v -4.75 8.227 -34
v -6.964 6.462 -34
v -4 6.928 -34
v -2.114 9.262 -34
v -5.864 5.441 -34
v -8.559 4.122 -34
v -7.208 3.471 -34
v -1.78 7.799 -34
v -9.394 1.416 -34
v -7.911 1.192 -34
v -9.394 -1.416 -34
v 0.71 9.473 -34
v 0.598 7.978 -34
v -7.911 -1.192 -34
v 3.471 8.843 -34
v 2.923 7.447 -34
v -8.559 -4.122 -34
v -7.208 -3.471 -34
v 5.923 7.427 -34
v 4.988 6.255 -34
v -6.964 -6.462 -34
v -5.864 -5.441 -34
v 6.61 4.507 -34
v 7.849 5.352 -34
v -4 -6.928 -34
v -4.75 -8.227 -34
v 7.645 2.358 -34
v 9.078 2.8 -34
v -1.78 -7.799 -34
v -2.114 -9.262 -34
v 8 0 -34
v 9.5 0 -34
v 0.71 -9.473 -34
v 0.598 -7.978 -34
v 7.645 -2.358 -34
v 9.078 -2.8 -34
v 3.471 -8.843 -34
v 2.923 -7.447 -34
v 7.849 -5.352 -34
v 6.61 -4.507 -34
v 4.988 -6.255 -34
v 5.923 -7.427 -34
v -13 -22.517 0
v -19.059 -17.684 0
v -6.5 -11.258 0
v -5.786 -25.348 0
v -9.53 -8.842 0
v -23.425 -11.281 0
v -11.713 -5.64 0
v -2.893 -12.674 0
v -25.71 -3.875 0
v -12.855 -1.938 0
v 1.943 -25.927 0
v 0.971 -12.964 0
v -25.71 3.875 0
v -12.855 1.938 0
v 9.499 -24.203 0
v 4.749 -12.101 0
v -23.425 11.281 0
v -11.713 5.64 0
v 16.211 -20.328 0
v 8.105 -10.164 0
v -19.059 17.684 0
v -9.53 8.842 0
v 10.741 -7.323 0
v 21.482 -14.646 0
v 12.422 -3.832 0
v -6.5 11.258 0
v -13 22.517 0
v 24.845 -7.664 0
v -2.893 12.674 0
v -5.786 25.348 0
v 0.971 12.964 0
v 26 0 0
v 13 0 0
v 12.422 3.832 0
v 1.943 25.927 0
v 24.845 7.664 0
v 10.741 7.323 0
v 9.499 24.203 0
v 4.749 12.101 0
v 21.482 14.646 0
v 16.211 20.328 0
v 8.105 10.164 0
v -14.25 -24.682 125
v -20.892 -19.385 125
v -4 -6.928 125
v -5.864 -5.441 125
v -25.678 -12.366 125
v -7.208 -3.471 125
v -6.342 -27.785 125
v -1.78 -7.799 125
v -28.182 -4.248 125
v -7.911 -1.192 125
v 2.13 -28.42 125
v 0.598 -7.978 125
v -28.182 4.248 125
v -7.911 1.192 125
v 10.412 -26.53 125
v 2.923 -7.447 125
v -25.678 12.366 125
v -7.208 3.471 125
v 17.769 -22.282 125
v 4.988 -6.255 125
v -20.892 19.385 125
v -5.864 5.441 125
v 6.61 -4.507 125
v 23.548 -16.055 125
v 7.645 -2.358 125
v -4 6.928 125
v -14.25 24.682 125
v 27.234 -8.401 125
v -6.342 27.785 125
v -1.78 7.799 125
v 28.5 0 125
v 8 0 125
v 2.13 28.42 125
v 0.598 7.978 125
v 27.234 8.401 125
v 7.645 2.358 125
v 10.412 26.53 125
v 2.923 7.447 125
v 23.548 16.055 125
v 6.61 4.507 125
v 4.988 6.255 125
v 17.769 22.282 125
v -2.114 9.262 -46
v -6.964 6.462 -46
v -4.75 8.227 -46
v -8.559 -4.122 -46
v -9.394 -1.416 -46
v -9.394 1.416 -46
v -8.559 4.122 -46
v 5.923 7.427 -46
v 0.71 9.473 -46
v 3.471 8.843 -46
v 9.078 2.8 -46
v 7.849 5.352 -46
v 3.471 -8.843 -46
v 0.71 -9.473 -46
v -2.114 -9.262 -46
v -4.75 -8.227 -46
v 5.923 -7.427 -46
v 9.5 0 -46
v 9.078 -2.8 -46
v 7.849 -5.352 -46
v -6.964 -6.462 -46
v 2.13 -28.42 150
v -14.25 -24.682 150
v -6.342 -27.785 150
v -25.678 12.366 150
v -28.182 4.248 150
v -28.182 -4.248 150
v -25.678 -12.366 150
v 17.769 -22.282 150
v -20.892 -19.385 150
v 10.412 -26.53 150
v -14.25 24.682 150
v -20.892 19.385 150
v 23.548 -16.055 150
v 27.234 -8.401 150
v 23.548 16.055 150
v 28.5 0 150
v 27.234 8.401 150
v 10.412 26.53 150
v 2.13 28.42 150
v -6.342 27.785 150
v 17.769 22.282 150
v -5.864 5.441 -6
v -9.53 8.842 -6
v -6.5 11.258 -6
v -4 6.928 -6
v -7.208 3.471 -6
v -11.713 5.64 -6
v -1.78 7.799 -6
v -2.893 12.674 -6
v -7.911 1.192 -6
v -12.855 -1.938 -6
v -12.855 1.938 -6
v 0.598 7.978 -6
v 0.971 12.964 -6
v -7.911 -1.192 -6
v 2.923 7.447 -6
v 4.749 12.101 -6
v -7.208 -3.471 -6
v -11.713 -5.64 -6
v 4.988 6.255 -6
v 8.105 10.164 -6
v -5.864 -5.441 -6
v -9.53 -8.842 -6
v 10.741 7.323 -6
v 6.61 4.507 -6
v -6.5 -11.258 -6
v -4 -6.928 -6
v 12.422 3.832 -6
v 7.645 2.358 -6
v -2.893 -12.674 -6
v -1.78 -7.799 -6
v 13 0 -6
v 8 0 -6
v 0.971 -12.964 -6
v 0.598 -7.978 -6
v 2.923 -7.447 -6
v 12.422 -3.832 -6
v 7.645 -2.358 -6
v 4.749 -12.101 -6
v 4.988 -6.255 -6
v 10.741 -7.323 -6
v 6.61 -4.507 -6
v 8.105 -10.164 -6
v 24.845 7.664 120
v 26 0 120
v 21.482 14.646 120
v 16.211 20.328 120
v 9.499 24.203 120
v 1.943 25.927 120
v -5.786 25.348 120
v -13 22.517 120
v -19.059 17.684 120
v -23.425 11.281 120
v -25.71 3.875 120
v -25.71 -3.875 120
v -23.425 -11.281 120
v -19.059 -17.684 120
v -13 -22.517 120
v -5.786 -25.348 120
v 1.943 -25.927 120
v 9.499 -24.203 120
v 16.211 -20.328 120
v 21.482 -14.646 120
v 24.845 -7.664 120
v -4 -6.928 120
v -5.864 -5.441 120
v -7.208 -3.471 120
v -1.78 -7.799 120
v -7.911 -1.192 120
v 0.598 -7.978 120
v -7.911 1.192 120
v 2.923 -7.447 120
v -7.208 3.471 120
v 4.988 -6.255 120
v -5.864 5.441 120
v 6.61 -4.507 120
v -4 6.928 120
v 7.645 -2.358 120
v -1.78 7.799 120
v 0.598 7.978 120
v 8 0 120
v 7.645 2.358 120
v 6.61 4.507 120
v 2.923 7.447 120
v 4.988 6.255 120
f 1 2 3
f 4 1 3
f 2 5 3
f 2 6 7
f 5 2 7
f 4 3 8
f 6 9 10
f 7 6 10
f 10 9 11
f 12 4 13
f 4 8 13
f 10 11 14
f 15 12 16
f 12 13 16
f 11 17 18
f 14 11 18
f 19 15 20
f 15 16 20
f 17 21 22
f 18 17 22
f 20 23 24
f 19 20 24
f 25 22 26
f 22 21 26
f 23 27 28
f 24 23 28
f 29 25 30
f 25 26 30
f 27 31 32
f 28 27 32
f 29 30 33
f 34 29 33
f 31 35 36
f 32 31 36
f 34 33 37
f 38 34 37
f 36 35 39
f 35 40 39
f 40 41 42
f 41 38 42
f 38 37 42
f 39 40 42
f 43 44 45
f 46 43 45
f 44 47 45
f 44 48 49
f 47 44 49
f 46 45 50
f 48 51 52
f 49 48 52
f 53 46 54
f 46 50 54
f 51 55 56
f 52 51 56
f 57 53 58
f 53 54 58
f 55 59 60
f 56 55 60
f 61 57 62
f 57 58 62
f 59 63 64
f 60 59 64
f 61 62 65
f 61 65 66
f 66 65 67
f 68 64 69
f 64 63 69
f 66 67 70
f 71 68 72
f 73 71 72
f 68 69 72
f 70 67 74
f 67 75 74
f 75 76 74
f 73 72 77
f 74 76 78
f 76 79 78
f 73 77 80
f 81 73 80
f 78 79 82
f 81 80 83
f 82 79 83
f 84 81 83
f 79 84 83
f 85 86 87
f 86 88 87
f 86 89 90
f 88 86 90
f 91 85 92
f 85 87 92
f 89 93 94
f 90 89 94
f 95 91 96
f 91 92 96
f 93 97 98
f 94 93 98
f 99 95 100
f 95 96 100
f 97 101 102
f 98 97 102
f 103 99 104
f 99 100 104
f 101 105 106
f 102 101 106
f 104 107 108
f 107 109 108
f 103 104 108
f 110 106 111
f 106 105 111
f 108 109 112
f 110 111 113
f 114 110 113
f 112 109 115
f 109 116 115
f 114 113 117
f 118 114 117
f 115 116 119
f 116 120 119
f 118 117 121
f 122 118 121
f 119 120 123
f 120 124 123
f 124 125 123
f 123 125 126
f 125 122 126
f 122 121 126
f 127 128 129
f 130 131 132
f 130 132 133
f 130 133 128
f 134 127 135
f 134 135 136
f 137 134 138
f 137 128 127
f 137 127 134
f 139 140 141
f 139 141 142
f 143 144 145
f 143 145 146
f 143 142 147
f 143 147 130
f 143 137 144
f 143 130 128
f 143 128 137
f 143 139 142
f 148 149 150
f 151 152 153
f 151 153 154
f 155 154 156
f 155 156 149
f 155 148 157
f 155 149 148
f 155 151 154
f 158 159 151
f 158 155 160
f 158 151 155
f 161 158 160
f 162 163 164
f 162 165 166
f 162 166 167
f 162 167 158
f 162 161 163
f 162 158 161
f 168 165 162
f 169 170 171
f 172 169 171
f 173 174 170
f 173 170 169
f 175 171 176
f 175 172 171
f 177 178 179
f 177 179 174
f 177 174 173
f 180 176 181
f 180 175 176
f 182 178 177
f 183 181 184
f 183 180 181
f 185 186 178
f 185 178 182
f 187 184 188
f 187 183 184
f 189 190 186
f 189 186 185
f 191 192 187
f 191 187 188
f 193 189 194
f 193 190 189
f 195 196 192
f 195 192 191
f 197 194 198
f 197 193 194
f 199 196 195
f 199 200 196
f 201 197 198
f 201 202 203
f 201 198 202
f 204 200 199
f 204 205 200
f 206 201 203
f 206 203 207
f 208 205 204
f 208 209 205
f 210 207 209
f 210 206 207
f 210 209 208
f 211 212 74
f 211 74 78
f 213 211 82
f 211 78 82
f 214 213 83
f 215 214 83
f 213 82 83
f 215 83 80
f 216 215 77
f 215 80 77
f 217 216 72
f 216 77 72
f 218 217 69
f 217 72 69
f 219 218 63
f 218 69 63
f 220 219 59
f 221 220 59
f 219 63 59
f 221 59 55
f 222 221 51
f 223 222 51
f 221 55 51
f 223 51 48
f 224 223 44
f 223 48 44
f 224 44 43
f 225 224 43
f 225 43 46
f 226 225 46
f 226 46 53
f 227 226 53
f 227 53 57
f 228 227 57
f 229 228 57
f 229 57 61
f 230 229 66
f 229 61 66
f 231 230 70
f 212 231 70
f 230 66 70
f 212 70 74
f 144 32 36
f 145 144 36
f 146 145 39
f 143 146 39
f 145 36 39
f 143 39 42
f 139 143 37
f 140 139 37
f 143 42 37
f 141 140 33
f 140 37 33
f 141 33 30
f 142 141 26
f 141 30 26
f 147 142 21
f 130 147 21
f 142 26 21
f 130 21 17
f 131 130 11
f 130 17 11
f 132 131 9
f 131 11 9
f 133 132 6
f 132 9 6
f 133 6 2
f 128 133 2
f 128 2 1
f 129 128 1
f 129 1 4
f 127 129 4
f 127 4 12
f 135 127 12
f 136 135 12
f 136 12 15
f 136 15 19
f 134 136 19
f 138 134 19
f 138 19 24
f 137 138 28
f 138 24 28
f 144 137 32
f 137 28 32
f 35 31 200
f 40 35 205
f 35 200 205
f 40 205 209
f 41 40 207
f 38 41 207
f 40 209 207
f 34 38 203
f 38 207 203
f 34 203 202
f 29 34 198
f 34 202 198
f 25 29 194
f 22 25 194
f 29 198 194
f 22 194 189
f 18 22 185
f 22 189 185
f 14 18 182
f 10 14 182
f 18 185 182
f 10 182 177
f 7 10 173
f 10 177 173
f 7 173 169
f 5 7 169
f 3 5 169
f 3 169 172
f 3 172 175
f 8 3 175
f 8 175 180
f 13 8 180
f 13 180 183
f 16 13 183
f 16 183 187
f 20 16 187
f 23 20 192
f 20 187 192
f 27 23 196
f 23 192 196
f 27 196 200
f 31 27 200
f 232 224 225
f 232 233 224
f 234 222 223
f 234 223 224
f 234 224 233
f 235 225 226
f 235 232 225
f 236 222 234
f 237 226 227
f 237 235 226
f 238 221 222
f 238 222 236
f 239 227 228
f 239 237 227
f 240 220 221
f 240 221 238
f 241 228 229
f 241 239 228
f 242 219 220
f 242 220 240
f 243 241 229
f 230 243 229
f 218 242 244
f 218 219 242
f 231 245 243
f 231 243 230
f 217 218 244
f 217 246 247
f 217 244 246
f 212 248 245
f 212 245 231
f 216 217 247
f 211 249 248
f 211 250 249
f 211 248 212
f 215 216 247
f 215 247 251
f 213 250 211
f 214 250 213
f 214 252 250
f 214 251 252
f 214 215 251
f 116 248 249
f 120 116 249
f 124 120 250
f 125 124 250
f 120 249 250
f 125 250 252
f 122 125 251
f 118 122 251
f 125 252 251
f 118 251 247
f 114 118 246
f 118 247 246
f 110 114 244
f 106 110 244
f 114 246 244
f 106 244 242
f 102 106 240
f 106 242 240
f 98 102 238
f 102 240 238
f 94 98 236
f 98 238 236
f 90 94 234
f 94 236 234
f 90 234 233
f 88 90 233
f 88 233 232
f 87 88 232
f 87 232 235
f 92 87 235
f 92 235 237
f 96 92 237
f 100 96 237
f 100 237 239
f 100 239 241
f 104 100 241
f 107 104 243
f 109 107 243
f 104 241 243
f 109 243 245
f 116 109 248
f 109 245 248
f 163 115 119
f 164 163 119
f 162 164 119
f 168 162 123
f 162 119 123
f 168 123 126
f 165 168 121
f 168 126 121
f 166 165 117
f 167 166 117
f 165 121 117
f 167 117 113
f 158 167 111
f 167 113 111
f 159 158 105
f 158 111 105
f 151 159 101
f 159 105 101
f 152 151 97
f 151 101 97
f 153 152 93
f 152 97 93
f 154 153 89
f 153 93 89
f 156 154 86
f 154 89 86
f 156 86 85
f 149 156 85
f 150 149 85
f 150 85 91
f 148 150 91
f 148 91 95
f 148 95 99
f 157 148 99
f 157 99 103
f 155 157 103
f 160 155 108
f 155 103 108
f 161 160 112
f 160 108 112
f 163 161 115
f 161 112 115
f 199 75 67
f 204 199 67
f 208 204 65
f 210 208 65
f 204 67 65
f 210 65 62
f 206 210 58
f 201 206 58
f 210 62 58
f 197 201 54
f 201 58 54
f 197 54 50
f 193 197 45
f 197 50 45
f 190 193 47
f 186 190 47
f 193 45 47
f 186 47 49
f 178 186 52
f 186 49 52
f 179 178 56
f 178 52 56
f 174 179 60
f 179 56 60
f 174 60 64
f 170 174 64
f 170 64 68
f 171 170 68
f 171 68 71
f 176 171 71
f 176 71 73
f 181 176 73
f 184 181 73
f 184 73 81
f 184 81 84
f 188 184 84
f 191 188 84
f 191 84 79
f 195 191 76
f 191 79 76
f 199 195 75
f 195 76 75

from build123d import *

# Parameters (mm, degrees)
SKETCH_R     = 26
PAD_DEPTH    = 120
SKETCH001_R  = 8
PAD001_DEPTH = 5
SKETCH002_R  = 28.5
PAD002_DEPTH = 25
SKETCH003_R  = 13
PAD003_DEPTH = 6
SKETCH004_R  = 8
PAD004_DEPTH = 28
SKETCH005_R  = 9.5
PAD005_DEPTH = 12


with BuildPart() as part:
    # Sketch → Pad (new body)
    with BuildSketch(Plane.XY):
        Circle(SKETCH_R)
    extrude(amount=PAD_DEPTH)

    # Sketch001 (on Face3 of Pad) → Pad001 (join)
    with BuildSketch(Plane.XY.offset(120)):
        Circle(SKETCH001_R)
    extrude(amount=PAD001_DEPTH)

    # Sketch002 (on Face5 of Pad001) → Pad002 (join)
    with BuildSketch(Plane.XY.offset(125)):
        Circle(SKETCH002_R)
    extrude(amount=PAD002_DEPTH)

    # Sketch003 (on Face7 of Pad002) → Pad003 (join)
    with BuildSketch(Plane(origin=(0, 0, 0), x_dir=(1, 0, 0), z_dir=(0, 0, -1))):
        Circle(SKETCH003_R)
    extrude(amount=PAD003_DEPTH)

    # Sketch004 (on Face9 of Pad003) → Pad004 (join)
    with BuildSketch(Plane(origin=(0, 0, -6), x_dir=(1, 0, 0), z_dir=(0, 0, -1))):
        Circle(SKETCH004_R)
    extrude(amount=PAD004_DEPTH)

    # Sketch005 (on Face11 of Pad004) → Pad005 (join)
    with BuildSketch(Plane(origin=(0, 0, -34), x_dir=(1, 0, 0), z_dir=(0, 0, -1))):
        Circle(SKETCH005_R)
    extrude(amount=PAD005_DEPTH)


solid = part.part
